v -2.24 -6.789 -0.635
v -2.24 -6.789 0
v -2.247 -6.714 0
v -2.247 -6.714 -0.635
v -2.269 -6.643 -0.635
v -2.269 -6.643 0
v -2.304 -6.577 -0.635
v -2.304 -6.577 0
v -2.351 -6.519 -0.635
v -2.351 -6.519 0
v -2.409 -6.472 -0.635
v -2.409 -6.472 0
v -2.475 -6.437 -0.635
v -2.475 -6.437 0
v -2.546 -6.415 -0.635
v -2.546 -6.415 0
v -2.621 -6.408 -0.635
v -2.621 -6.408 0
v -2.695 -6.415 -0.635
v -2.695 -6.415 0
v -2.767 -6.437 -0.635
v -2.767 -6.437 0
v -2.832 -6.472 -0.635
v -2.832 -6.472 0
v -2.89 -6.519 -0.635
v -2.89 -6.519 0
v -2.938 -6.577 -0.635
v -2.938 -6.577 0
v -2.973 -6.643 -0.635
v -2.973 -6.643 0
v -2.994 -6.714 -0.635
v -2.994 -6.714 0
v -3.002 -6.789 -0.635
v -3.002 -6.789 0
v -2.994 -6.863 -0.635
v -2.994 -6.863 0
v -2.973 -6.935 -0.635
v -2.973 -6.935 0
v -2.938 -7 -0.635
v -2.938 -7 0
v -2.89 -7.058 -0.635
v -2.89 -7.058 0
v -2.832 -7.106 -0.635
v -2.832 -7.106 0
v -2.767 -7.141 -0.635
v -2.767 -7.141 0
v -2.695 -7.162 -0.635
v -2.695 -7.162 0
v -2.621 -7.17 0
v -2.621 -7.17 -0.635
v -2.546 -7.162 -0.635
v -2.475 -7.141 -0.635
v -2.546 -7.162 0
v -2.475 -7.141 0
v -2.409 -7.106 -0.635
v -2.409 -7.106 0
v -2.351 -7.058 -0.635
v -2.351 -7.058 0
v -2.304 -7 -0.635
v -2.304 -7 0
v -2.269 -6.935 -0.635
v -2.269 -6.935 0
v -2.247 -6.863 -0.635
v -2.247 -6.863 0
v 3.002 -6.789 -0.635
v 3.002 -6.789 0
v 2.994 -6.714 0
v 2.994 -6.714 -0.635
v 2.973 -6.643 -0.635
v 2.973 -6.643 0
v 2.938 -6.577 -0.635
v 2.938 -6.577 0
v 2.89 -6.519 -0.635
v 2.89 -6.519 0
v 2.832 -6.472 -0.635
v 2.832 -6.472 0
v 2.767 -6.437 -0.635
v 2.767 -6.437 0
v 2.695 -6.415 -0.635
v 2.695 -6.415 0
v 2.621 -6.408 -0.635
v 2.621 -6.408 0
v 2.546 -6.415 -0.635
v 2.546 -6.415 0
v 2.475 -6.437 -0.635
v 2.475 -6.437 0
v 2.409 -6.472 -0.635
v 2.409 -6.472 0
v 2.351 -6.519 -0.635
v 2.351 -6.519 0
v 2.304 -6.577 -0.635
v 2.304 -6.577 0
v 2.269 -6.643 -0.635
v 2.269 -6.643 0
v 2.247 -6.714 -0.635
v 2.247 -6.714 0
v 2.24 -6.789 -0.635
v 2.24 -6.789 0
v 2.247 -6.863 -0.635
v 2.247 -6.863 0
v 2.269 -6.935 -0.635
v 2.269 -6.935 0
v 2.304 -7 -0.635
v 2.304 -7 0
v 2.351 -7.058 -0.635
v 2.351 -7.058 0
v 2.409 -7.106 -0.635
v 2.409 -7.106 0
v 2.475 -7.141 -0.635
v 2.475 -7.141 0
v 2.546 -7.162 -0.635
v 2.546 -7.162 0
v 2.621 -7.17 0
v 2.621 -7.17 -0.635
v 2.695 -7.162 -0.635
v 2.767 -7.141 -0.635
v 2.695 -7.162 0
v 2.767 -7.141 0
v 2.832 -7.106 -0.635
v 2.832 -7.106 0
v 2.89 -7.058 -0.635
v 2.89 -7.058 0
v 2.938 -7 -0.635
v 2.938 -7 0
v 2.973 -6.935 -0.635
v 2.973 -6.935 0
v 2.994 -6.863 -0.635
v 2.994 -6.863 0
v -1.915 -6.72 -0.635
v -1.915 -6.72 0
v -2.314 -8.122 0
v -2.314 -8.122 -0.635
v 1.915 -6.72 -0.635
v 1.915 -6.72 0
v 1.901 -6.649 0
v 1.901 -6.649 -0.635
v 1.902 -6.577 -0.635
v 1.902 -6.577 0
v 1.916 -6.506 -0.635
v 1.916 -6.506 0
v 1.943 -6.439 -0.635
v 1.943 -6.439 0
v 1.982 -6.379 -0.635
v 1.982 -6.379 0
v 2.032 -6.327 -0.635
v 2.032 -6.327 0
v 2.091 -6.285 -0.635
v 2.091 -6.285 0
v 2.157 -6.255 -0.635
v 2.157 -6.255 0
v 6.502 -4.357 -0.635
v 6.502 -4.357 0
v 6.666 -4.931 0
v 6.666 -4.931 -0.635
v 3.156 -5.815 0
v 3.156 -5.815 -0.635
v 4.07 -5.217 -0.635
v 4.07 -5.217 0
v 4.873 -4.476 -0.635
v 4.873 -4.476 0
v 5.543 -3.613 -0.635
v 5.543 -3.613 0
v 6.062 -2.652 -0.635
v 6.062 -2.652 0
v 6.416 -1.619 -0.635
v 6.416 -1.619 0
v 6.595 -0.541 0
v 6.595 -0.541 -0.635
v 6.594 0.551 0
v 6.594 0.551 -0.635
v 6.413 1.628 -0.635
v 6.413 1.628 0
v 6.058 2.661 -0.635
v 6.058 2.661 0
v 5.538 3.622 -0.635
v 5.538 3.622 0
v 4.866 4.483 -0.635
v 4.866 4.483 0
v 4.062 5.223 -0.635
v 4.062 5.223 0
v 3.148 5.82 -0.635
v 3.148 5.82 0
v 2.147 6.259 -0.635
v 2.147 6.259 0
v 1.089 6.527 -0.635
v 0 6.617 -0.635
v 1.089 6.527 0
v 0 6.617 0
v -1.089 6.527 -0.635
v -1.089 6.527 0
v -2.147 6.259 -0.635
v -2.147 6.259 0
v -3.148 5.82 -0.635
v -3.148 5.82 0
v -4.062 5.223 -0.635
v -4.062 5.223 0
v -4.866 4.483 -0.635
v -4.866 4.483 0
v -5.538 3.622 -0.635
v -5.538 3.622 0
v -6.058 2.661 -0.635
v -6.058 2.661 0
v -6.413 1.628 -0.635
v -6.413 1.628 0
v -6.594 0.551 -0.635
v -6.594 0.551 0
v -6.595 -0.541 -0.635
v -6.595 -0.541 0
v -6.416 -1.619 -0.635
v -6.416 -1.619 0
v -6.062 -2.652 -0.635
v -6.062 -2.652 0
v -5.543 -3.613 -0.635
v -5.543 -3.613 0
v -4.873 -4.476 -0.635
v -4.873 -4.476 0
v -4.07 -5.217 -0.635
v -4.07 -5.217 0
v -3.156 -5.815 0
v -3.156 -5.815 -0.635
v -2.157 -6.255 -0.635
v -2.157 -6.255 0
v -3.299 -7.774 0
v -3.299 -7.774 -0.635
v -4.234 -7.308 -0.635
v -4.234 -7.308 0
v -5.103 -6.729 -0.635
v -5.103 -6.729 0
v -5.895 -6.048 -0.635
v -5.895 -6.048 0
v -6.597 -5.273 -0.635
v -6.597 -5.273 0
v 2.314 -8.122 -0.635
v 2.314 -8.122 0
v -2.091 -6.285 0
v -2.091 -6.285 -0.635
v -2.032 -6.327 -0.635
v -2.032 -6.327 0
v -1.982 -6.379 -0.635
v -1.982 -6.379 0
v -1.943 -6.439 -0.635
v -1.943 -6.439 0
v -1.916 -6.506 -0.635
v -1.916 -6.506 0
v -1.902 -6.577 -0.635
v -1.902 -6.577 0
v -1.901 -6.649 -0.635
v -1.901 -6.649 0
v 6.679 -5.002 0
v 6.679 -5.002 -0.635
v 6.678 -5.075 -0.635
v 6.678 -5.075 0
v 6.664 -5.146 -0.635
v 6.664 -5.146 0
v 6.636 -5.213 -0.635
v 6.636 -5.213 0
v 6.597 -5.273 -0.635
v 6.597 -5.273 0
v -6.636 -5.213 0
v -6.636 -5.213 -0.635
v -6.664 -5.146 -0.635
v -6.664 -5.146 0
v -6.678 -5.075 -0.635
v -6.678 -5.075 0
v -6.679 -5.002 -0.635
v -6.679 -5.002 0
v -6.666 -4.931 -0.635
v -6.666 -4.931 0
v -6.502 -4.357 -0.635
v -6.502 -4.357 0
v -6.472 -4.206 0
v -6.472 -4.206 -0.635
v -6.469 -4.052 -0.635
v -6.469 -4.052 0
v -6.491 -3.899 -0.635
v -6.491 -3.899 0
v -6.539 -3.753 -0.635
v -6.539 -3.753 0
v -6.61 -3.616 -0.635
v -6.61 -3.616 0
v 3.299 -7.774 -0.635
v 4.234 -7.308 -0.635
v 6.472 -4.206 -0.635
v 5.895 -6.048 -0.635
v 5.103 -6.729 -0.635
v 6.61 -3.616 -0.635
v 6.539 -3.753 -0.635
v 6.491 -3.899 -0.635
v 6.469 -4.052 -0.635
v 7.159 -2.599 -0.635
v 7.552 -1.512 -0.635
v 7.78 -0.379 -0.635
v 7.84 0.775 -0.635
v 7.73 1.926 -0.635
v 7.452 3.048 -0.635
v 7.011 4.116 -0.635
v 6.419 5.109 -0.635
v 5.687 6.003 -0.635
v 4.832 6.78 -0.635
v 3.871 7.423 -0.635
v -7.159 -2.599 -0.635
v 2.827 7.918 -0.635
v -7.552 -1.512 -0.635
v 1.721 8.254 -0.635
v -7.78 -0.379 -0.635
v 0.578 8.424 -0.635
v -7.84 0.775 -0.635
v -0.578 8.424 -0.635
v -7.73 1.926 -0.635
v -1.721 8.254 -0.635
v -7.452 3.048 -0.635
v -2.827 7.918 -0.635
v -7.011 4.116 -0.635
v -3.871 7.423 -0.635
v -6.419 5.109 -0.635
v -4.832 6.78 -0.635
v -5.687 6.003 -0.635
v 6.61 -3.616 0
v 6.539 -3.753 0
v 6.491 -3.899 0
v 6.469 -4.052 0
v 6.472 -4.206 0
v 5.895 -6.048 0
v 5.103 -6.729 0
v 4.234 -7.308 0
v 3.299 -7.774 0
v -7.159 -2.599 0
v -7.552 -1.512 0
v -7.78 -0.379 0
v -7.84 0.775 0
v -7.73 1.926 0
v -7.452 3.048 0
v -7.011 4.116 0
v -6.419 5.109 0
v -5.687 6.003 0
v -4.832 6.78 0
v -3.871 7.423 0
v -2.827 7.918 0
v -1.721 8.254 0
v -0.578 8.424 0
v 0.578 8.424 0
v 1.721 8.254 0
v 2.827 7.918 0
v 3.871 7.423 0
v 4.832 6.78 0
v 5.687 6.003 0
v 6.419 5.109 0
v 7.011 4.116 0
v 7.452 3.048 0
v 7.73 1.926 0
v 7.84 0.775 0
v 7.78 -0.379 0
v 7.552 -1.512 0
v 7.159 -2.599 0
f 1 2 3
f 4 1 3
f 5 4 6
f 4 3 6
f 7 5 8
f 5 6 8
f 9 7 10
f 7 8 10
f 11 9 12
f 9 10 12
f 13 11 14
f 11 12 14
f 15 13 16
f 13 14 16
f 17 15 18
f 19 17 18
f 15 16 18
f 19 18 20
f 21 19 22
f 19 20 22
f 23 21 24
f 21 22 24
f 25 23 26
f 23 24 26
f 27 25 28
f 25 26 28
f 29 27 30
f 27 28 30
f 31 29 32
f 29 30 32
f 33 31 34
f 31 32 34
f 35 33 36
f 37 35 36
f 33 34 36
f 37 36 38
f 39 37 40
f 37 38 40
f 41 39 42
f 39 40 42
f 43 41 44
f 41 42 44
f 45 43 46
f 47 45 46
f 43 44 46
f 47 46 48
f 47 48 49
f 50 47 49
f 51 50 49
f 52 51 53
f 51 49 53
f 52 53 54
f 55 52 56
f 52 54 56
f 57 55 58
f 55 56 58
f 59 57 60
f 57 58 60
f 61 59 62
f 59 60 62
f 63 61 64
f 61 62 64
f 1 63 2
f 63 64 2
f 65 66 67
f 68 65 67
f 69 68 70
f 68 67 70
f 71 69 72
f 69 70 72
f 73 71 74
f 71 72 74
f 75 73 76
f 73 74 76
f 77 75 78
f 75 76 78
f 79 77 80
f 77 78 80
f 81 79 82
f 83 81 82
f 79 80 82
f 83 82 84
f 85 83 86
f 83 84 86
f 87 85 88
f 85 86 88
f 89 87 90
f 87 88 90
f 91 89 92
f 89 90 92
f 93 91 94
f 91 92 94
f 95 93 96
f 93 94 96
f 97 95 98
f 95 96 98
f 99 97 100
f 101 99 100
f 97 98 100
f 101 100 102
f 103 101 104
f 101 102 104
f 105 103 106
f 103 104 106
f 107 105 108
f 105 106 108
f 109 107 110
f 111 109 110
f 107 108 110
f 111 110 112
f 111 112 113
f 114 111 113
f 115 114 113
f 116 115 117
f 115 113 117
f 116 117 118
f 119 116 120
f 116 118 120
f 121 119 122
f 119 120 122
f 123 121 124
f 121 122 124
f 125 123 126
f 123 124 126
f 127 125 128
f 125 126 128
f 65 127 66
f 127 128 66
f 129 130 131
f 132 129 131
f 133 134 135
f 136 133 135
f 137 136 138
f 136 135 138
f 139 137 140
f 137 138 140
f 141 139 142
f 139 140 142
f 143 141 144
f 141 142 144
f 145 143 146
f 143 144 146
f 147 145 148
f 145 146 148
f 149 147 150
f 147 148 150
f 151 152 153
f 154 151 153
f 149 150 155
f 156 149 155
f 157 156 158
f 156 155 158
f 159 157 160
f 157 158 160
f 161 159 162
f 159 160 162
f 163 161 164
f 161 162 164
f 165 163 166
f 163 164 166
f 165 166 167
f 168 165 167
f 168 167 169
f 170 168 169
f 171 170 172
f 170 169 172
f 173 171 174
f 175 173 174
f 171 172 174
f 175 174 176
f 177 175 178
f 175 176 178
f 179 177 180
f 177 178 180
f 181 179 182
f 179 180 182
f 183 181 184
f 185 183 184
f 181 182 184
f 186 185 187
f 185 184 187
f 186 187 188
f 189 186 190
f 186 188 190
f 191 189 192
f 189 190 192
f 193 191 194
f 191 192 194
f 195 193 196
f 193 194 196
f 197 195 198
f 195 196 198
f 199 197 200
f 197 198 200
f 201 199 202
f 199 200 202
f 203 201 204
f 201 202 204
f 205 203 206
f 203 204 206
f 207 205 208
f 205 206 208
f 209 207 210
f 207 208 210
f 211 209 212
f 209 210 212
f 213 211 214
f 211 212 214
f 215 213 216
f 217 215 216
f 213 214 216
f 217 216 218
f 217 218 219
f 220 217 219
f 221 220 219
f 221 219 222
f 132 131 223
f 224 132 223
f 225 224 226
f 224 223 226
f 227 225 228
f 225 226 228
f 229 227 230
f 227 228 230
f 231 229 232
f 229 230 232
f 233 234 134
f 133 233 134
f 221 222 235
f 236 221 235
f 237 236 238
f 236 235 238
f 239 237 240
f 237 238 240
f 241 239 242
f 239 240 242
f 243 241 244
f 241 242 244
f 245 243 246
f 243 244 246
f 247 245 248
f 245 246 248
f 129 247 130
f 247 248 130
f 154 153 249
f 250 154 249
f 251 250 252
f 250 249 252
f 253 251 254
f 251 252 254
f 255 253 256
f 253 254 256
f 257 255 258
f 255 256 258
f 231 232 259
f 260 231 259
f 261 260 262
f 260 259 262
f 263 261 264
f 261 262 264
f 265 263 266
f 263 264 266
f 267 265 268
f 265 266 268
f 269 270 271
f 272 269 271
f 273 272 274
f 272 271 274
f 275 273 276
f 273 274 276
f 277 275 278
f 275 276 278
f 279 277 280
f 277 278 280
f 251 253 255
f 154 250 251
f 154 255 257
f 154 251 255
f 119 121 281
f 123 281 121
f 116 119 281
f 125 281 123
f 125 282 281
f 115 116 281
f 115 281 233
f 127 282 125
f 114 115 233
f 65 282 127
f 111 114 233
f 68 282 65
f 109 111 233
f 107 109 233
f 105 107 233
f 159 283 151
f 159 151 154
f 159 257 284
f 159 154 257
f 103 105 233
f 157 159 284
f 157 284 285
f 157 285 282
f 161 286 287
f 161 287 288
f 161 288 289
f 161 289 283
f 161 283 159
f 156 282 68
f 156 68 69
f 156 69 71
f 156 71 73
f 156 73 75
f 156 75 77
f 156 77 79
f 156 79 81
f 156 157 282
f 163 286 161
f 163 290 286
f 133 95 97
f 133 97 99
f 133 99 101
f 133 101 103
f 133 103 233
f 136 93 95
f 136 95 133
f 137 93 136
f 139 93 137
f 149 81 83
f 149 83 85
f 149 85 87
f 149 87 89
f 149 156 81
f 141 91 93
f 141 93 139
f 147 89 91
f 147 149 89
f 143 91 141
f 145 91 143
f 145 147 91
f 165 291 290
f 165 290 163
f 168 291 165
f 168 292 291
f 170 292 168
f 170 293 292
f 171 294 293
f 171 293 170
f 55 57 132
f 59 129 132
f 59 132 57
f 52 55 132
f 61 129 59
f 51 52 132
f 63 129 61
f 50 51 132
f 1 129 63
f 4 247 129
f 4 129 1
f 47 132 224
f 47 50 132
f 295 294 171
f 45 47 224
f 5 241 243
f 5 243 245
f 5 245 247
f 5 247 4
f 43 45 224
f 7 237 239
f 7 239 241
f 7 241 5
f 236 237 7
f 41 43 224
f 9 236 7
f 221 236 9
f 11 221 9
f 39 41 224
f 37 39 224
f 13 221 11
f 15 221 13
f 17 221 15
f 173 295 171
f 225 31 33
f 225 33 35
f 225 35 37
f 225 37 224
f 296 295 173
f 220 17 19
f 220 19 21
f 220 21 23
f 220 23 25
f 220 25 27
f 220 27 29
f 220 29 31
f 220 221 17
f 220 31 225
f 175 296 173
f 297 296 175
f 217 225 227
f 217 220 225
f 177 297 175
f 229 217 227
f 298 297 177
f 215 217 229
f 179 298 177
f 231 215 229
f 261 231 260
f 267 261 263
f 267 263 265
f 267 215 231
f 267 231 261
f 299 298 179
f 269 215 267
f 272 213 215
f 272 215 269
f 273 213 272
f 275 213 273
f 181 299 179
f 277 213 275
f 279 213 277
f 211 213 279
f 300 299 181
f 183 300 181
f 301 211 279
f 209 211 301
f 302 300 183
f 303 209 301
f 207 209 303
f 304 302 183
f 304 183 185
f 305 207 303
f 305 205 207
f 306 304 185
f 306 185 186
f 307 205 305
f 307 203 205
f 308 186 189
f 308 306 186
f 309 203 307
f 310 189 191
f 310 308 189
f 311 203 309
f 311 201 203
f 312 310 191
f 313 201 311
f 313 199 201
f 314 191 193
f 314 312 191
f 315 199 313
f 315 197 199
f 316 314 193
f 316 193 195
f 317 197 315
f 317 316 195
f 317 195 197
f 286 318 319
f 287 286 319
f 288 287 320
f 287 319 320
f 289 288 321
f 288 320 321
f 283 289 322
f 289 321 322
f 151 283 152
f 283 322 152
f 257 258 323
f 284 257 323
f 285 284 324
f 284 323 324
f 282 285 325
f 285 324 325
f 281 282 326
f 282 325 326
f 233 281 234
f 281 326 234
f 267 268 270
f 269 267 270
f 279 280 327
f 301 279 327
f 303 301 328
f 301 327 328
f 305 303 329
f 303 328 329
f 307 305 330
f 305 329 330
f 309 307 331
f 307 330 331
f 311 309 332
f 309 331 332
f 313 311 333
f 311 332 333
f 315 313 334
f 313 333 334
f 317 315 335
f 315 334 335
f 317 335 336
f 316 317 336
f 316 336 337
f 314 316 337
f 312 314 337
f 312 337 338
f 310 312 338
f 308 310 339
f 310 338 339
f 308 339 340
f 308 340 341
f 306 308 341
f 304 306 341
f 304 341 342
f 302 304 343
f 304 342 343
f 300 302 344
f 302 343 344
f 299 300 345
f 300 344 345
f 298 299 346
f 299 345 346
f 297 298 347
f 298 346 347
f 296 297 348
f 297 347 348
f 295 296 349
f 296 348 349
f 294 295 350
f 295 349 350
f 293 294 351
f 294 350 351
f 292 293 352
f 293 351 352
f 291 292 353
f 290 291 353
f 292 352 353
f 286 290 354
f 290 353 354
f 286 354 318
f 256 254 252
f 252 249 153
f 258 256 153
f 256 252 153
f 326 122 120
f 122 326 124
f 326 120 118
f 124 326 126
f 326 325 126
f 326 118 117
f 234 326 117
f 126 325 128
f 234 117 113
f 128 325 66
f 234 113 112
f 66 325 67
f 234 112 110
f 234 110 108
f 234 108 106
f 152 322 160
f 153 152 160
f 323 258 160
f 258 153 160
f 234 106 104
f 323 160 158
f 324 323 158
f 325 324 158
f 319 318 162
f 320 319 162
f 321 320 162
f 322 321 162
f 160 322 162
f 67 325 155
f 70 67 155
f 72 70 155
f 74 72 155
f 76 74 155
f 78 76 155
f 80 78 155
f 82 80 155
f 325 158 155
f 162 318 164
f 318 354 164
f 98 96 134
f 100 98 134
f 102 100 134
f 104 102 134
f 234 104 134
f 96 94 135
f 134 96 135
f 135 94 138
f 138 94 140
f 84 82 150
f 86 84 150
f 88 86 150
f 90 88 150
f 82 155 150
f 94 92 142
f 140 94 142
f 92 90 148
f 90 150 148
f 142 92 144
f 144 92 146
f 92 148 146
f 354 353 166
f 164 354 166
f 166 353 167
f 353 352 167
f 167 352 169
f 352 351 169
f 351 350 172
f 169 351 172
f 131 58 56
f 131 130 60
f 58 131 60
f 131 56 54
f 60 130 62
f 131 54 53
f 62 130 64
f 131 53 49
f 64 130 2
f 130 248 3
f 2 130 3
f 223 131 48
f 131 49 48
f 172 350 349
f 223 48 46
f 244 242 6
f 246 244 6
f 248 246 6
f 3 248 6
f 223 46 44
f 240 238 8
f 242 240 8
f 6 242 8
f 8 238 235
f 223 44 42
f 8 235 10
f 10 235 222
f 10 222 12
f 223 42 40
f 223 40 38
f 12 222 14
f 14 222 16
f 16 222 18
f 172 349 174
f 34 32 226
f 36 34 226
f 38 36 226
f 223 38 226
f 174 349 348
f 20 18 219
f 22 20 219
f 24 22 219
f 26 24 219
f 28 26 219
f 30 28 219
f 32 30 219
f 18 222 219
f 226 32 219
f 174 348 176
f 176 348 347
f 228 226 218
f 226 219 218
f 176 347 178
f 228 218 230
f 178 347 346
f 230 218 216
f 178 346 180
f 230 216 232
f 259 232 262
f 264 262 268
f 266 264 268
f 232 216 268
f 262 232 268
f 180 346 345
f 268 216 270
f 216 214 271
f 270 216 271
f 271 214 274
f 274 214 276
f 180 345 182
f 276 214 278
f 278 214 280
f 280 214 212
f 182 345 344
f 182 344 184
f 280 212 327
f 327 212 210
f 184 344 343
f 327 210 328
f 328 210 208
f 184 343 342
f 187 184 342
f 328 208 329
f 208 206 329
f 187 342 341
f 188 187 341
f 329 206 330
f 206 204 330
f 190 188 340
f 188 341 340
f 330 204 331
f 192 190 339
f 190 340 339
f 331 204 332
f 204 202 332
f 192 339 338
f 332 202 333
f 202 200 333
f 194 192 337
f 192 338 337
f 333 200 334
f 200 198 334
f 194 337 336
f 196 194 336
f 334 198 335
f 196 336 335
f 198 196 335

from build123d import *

# Parameters (mm, degrees)
BODYSKE_R  = 0.381
BODY_DEPTH = 0.635


with BuildPart() as part:
    # BodySke → Body (new body)
    with BuildSketch(Plane.XY):
        with BuildLine():
            Line((-1.91450535, -6.719919163), (-2.314042344, -8.122295136))
            ThreePointArc((-2.314042344, -8.122295136), (-4.67753589, -7.031865204), (-6.59672094, -5.273494391))
            ThreePointArc((-6.59672094, -5.273494391), (-6.672649179, -5.110694444), (-6.665543836, -4.931199501))
            Line((-6.665543836, -4.931199501), (-6.501980098, -4.357090321))
            ThreePointArc((-6.501980098, -4.357090321), (-6.476670268, -3.974948798), (-6.610396151, -3.616075396))
            ThreePointArc((-6.610396151, -3.616075396), (0, 8.4455), (6.610396151, -3.616075396))
            ThreePointArc((6.610396151, -3.616075396), (6.476670268, -3.974948798), (6.501980098, -4.357090321))
            Line((6.501980098, -4.357090321), (6.665543836, -4.931199501))
            ThreePointArc((6.665543836, -4.931199501), (6.672649179, -5.110694444), (6.59672094, -5.273494391))
            ThreePointArc((6.59672094, -5.273494391), (4.67753589, -7.031865204), (2.314042344, -8.122295136))
            Line((2.314042344, -8.122295136), (1.91450535, -6.719919163))
            ThreePointArc((1.91450535, -6.719919163), (1.943087835, -6.439380692), (2.156736403, -6.255334282))
            ThreePointArc((2.156736403, -6.255334282), (0, 6.6167), (-2.156736403, -6.255334282))
            ThreePointArc((-2.156736403, -6.255334282), (-1.943087835, -6.439380692), (-1.91450535, -6.719919163))
        make_face()
        with Locations((2.620803478, -6.78878292)):
            Circle(BODYSKE_R, mode=Mode.SUBTRACT)
        with Locations((-2.620803478, -6.78878292)):
            Circle(BODYSKE_R, mode=Mode.SUBTRACT)
    extrude(amount=-BODY_DEPTH)


solid = part.part
